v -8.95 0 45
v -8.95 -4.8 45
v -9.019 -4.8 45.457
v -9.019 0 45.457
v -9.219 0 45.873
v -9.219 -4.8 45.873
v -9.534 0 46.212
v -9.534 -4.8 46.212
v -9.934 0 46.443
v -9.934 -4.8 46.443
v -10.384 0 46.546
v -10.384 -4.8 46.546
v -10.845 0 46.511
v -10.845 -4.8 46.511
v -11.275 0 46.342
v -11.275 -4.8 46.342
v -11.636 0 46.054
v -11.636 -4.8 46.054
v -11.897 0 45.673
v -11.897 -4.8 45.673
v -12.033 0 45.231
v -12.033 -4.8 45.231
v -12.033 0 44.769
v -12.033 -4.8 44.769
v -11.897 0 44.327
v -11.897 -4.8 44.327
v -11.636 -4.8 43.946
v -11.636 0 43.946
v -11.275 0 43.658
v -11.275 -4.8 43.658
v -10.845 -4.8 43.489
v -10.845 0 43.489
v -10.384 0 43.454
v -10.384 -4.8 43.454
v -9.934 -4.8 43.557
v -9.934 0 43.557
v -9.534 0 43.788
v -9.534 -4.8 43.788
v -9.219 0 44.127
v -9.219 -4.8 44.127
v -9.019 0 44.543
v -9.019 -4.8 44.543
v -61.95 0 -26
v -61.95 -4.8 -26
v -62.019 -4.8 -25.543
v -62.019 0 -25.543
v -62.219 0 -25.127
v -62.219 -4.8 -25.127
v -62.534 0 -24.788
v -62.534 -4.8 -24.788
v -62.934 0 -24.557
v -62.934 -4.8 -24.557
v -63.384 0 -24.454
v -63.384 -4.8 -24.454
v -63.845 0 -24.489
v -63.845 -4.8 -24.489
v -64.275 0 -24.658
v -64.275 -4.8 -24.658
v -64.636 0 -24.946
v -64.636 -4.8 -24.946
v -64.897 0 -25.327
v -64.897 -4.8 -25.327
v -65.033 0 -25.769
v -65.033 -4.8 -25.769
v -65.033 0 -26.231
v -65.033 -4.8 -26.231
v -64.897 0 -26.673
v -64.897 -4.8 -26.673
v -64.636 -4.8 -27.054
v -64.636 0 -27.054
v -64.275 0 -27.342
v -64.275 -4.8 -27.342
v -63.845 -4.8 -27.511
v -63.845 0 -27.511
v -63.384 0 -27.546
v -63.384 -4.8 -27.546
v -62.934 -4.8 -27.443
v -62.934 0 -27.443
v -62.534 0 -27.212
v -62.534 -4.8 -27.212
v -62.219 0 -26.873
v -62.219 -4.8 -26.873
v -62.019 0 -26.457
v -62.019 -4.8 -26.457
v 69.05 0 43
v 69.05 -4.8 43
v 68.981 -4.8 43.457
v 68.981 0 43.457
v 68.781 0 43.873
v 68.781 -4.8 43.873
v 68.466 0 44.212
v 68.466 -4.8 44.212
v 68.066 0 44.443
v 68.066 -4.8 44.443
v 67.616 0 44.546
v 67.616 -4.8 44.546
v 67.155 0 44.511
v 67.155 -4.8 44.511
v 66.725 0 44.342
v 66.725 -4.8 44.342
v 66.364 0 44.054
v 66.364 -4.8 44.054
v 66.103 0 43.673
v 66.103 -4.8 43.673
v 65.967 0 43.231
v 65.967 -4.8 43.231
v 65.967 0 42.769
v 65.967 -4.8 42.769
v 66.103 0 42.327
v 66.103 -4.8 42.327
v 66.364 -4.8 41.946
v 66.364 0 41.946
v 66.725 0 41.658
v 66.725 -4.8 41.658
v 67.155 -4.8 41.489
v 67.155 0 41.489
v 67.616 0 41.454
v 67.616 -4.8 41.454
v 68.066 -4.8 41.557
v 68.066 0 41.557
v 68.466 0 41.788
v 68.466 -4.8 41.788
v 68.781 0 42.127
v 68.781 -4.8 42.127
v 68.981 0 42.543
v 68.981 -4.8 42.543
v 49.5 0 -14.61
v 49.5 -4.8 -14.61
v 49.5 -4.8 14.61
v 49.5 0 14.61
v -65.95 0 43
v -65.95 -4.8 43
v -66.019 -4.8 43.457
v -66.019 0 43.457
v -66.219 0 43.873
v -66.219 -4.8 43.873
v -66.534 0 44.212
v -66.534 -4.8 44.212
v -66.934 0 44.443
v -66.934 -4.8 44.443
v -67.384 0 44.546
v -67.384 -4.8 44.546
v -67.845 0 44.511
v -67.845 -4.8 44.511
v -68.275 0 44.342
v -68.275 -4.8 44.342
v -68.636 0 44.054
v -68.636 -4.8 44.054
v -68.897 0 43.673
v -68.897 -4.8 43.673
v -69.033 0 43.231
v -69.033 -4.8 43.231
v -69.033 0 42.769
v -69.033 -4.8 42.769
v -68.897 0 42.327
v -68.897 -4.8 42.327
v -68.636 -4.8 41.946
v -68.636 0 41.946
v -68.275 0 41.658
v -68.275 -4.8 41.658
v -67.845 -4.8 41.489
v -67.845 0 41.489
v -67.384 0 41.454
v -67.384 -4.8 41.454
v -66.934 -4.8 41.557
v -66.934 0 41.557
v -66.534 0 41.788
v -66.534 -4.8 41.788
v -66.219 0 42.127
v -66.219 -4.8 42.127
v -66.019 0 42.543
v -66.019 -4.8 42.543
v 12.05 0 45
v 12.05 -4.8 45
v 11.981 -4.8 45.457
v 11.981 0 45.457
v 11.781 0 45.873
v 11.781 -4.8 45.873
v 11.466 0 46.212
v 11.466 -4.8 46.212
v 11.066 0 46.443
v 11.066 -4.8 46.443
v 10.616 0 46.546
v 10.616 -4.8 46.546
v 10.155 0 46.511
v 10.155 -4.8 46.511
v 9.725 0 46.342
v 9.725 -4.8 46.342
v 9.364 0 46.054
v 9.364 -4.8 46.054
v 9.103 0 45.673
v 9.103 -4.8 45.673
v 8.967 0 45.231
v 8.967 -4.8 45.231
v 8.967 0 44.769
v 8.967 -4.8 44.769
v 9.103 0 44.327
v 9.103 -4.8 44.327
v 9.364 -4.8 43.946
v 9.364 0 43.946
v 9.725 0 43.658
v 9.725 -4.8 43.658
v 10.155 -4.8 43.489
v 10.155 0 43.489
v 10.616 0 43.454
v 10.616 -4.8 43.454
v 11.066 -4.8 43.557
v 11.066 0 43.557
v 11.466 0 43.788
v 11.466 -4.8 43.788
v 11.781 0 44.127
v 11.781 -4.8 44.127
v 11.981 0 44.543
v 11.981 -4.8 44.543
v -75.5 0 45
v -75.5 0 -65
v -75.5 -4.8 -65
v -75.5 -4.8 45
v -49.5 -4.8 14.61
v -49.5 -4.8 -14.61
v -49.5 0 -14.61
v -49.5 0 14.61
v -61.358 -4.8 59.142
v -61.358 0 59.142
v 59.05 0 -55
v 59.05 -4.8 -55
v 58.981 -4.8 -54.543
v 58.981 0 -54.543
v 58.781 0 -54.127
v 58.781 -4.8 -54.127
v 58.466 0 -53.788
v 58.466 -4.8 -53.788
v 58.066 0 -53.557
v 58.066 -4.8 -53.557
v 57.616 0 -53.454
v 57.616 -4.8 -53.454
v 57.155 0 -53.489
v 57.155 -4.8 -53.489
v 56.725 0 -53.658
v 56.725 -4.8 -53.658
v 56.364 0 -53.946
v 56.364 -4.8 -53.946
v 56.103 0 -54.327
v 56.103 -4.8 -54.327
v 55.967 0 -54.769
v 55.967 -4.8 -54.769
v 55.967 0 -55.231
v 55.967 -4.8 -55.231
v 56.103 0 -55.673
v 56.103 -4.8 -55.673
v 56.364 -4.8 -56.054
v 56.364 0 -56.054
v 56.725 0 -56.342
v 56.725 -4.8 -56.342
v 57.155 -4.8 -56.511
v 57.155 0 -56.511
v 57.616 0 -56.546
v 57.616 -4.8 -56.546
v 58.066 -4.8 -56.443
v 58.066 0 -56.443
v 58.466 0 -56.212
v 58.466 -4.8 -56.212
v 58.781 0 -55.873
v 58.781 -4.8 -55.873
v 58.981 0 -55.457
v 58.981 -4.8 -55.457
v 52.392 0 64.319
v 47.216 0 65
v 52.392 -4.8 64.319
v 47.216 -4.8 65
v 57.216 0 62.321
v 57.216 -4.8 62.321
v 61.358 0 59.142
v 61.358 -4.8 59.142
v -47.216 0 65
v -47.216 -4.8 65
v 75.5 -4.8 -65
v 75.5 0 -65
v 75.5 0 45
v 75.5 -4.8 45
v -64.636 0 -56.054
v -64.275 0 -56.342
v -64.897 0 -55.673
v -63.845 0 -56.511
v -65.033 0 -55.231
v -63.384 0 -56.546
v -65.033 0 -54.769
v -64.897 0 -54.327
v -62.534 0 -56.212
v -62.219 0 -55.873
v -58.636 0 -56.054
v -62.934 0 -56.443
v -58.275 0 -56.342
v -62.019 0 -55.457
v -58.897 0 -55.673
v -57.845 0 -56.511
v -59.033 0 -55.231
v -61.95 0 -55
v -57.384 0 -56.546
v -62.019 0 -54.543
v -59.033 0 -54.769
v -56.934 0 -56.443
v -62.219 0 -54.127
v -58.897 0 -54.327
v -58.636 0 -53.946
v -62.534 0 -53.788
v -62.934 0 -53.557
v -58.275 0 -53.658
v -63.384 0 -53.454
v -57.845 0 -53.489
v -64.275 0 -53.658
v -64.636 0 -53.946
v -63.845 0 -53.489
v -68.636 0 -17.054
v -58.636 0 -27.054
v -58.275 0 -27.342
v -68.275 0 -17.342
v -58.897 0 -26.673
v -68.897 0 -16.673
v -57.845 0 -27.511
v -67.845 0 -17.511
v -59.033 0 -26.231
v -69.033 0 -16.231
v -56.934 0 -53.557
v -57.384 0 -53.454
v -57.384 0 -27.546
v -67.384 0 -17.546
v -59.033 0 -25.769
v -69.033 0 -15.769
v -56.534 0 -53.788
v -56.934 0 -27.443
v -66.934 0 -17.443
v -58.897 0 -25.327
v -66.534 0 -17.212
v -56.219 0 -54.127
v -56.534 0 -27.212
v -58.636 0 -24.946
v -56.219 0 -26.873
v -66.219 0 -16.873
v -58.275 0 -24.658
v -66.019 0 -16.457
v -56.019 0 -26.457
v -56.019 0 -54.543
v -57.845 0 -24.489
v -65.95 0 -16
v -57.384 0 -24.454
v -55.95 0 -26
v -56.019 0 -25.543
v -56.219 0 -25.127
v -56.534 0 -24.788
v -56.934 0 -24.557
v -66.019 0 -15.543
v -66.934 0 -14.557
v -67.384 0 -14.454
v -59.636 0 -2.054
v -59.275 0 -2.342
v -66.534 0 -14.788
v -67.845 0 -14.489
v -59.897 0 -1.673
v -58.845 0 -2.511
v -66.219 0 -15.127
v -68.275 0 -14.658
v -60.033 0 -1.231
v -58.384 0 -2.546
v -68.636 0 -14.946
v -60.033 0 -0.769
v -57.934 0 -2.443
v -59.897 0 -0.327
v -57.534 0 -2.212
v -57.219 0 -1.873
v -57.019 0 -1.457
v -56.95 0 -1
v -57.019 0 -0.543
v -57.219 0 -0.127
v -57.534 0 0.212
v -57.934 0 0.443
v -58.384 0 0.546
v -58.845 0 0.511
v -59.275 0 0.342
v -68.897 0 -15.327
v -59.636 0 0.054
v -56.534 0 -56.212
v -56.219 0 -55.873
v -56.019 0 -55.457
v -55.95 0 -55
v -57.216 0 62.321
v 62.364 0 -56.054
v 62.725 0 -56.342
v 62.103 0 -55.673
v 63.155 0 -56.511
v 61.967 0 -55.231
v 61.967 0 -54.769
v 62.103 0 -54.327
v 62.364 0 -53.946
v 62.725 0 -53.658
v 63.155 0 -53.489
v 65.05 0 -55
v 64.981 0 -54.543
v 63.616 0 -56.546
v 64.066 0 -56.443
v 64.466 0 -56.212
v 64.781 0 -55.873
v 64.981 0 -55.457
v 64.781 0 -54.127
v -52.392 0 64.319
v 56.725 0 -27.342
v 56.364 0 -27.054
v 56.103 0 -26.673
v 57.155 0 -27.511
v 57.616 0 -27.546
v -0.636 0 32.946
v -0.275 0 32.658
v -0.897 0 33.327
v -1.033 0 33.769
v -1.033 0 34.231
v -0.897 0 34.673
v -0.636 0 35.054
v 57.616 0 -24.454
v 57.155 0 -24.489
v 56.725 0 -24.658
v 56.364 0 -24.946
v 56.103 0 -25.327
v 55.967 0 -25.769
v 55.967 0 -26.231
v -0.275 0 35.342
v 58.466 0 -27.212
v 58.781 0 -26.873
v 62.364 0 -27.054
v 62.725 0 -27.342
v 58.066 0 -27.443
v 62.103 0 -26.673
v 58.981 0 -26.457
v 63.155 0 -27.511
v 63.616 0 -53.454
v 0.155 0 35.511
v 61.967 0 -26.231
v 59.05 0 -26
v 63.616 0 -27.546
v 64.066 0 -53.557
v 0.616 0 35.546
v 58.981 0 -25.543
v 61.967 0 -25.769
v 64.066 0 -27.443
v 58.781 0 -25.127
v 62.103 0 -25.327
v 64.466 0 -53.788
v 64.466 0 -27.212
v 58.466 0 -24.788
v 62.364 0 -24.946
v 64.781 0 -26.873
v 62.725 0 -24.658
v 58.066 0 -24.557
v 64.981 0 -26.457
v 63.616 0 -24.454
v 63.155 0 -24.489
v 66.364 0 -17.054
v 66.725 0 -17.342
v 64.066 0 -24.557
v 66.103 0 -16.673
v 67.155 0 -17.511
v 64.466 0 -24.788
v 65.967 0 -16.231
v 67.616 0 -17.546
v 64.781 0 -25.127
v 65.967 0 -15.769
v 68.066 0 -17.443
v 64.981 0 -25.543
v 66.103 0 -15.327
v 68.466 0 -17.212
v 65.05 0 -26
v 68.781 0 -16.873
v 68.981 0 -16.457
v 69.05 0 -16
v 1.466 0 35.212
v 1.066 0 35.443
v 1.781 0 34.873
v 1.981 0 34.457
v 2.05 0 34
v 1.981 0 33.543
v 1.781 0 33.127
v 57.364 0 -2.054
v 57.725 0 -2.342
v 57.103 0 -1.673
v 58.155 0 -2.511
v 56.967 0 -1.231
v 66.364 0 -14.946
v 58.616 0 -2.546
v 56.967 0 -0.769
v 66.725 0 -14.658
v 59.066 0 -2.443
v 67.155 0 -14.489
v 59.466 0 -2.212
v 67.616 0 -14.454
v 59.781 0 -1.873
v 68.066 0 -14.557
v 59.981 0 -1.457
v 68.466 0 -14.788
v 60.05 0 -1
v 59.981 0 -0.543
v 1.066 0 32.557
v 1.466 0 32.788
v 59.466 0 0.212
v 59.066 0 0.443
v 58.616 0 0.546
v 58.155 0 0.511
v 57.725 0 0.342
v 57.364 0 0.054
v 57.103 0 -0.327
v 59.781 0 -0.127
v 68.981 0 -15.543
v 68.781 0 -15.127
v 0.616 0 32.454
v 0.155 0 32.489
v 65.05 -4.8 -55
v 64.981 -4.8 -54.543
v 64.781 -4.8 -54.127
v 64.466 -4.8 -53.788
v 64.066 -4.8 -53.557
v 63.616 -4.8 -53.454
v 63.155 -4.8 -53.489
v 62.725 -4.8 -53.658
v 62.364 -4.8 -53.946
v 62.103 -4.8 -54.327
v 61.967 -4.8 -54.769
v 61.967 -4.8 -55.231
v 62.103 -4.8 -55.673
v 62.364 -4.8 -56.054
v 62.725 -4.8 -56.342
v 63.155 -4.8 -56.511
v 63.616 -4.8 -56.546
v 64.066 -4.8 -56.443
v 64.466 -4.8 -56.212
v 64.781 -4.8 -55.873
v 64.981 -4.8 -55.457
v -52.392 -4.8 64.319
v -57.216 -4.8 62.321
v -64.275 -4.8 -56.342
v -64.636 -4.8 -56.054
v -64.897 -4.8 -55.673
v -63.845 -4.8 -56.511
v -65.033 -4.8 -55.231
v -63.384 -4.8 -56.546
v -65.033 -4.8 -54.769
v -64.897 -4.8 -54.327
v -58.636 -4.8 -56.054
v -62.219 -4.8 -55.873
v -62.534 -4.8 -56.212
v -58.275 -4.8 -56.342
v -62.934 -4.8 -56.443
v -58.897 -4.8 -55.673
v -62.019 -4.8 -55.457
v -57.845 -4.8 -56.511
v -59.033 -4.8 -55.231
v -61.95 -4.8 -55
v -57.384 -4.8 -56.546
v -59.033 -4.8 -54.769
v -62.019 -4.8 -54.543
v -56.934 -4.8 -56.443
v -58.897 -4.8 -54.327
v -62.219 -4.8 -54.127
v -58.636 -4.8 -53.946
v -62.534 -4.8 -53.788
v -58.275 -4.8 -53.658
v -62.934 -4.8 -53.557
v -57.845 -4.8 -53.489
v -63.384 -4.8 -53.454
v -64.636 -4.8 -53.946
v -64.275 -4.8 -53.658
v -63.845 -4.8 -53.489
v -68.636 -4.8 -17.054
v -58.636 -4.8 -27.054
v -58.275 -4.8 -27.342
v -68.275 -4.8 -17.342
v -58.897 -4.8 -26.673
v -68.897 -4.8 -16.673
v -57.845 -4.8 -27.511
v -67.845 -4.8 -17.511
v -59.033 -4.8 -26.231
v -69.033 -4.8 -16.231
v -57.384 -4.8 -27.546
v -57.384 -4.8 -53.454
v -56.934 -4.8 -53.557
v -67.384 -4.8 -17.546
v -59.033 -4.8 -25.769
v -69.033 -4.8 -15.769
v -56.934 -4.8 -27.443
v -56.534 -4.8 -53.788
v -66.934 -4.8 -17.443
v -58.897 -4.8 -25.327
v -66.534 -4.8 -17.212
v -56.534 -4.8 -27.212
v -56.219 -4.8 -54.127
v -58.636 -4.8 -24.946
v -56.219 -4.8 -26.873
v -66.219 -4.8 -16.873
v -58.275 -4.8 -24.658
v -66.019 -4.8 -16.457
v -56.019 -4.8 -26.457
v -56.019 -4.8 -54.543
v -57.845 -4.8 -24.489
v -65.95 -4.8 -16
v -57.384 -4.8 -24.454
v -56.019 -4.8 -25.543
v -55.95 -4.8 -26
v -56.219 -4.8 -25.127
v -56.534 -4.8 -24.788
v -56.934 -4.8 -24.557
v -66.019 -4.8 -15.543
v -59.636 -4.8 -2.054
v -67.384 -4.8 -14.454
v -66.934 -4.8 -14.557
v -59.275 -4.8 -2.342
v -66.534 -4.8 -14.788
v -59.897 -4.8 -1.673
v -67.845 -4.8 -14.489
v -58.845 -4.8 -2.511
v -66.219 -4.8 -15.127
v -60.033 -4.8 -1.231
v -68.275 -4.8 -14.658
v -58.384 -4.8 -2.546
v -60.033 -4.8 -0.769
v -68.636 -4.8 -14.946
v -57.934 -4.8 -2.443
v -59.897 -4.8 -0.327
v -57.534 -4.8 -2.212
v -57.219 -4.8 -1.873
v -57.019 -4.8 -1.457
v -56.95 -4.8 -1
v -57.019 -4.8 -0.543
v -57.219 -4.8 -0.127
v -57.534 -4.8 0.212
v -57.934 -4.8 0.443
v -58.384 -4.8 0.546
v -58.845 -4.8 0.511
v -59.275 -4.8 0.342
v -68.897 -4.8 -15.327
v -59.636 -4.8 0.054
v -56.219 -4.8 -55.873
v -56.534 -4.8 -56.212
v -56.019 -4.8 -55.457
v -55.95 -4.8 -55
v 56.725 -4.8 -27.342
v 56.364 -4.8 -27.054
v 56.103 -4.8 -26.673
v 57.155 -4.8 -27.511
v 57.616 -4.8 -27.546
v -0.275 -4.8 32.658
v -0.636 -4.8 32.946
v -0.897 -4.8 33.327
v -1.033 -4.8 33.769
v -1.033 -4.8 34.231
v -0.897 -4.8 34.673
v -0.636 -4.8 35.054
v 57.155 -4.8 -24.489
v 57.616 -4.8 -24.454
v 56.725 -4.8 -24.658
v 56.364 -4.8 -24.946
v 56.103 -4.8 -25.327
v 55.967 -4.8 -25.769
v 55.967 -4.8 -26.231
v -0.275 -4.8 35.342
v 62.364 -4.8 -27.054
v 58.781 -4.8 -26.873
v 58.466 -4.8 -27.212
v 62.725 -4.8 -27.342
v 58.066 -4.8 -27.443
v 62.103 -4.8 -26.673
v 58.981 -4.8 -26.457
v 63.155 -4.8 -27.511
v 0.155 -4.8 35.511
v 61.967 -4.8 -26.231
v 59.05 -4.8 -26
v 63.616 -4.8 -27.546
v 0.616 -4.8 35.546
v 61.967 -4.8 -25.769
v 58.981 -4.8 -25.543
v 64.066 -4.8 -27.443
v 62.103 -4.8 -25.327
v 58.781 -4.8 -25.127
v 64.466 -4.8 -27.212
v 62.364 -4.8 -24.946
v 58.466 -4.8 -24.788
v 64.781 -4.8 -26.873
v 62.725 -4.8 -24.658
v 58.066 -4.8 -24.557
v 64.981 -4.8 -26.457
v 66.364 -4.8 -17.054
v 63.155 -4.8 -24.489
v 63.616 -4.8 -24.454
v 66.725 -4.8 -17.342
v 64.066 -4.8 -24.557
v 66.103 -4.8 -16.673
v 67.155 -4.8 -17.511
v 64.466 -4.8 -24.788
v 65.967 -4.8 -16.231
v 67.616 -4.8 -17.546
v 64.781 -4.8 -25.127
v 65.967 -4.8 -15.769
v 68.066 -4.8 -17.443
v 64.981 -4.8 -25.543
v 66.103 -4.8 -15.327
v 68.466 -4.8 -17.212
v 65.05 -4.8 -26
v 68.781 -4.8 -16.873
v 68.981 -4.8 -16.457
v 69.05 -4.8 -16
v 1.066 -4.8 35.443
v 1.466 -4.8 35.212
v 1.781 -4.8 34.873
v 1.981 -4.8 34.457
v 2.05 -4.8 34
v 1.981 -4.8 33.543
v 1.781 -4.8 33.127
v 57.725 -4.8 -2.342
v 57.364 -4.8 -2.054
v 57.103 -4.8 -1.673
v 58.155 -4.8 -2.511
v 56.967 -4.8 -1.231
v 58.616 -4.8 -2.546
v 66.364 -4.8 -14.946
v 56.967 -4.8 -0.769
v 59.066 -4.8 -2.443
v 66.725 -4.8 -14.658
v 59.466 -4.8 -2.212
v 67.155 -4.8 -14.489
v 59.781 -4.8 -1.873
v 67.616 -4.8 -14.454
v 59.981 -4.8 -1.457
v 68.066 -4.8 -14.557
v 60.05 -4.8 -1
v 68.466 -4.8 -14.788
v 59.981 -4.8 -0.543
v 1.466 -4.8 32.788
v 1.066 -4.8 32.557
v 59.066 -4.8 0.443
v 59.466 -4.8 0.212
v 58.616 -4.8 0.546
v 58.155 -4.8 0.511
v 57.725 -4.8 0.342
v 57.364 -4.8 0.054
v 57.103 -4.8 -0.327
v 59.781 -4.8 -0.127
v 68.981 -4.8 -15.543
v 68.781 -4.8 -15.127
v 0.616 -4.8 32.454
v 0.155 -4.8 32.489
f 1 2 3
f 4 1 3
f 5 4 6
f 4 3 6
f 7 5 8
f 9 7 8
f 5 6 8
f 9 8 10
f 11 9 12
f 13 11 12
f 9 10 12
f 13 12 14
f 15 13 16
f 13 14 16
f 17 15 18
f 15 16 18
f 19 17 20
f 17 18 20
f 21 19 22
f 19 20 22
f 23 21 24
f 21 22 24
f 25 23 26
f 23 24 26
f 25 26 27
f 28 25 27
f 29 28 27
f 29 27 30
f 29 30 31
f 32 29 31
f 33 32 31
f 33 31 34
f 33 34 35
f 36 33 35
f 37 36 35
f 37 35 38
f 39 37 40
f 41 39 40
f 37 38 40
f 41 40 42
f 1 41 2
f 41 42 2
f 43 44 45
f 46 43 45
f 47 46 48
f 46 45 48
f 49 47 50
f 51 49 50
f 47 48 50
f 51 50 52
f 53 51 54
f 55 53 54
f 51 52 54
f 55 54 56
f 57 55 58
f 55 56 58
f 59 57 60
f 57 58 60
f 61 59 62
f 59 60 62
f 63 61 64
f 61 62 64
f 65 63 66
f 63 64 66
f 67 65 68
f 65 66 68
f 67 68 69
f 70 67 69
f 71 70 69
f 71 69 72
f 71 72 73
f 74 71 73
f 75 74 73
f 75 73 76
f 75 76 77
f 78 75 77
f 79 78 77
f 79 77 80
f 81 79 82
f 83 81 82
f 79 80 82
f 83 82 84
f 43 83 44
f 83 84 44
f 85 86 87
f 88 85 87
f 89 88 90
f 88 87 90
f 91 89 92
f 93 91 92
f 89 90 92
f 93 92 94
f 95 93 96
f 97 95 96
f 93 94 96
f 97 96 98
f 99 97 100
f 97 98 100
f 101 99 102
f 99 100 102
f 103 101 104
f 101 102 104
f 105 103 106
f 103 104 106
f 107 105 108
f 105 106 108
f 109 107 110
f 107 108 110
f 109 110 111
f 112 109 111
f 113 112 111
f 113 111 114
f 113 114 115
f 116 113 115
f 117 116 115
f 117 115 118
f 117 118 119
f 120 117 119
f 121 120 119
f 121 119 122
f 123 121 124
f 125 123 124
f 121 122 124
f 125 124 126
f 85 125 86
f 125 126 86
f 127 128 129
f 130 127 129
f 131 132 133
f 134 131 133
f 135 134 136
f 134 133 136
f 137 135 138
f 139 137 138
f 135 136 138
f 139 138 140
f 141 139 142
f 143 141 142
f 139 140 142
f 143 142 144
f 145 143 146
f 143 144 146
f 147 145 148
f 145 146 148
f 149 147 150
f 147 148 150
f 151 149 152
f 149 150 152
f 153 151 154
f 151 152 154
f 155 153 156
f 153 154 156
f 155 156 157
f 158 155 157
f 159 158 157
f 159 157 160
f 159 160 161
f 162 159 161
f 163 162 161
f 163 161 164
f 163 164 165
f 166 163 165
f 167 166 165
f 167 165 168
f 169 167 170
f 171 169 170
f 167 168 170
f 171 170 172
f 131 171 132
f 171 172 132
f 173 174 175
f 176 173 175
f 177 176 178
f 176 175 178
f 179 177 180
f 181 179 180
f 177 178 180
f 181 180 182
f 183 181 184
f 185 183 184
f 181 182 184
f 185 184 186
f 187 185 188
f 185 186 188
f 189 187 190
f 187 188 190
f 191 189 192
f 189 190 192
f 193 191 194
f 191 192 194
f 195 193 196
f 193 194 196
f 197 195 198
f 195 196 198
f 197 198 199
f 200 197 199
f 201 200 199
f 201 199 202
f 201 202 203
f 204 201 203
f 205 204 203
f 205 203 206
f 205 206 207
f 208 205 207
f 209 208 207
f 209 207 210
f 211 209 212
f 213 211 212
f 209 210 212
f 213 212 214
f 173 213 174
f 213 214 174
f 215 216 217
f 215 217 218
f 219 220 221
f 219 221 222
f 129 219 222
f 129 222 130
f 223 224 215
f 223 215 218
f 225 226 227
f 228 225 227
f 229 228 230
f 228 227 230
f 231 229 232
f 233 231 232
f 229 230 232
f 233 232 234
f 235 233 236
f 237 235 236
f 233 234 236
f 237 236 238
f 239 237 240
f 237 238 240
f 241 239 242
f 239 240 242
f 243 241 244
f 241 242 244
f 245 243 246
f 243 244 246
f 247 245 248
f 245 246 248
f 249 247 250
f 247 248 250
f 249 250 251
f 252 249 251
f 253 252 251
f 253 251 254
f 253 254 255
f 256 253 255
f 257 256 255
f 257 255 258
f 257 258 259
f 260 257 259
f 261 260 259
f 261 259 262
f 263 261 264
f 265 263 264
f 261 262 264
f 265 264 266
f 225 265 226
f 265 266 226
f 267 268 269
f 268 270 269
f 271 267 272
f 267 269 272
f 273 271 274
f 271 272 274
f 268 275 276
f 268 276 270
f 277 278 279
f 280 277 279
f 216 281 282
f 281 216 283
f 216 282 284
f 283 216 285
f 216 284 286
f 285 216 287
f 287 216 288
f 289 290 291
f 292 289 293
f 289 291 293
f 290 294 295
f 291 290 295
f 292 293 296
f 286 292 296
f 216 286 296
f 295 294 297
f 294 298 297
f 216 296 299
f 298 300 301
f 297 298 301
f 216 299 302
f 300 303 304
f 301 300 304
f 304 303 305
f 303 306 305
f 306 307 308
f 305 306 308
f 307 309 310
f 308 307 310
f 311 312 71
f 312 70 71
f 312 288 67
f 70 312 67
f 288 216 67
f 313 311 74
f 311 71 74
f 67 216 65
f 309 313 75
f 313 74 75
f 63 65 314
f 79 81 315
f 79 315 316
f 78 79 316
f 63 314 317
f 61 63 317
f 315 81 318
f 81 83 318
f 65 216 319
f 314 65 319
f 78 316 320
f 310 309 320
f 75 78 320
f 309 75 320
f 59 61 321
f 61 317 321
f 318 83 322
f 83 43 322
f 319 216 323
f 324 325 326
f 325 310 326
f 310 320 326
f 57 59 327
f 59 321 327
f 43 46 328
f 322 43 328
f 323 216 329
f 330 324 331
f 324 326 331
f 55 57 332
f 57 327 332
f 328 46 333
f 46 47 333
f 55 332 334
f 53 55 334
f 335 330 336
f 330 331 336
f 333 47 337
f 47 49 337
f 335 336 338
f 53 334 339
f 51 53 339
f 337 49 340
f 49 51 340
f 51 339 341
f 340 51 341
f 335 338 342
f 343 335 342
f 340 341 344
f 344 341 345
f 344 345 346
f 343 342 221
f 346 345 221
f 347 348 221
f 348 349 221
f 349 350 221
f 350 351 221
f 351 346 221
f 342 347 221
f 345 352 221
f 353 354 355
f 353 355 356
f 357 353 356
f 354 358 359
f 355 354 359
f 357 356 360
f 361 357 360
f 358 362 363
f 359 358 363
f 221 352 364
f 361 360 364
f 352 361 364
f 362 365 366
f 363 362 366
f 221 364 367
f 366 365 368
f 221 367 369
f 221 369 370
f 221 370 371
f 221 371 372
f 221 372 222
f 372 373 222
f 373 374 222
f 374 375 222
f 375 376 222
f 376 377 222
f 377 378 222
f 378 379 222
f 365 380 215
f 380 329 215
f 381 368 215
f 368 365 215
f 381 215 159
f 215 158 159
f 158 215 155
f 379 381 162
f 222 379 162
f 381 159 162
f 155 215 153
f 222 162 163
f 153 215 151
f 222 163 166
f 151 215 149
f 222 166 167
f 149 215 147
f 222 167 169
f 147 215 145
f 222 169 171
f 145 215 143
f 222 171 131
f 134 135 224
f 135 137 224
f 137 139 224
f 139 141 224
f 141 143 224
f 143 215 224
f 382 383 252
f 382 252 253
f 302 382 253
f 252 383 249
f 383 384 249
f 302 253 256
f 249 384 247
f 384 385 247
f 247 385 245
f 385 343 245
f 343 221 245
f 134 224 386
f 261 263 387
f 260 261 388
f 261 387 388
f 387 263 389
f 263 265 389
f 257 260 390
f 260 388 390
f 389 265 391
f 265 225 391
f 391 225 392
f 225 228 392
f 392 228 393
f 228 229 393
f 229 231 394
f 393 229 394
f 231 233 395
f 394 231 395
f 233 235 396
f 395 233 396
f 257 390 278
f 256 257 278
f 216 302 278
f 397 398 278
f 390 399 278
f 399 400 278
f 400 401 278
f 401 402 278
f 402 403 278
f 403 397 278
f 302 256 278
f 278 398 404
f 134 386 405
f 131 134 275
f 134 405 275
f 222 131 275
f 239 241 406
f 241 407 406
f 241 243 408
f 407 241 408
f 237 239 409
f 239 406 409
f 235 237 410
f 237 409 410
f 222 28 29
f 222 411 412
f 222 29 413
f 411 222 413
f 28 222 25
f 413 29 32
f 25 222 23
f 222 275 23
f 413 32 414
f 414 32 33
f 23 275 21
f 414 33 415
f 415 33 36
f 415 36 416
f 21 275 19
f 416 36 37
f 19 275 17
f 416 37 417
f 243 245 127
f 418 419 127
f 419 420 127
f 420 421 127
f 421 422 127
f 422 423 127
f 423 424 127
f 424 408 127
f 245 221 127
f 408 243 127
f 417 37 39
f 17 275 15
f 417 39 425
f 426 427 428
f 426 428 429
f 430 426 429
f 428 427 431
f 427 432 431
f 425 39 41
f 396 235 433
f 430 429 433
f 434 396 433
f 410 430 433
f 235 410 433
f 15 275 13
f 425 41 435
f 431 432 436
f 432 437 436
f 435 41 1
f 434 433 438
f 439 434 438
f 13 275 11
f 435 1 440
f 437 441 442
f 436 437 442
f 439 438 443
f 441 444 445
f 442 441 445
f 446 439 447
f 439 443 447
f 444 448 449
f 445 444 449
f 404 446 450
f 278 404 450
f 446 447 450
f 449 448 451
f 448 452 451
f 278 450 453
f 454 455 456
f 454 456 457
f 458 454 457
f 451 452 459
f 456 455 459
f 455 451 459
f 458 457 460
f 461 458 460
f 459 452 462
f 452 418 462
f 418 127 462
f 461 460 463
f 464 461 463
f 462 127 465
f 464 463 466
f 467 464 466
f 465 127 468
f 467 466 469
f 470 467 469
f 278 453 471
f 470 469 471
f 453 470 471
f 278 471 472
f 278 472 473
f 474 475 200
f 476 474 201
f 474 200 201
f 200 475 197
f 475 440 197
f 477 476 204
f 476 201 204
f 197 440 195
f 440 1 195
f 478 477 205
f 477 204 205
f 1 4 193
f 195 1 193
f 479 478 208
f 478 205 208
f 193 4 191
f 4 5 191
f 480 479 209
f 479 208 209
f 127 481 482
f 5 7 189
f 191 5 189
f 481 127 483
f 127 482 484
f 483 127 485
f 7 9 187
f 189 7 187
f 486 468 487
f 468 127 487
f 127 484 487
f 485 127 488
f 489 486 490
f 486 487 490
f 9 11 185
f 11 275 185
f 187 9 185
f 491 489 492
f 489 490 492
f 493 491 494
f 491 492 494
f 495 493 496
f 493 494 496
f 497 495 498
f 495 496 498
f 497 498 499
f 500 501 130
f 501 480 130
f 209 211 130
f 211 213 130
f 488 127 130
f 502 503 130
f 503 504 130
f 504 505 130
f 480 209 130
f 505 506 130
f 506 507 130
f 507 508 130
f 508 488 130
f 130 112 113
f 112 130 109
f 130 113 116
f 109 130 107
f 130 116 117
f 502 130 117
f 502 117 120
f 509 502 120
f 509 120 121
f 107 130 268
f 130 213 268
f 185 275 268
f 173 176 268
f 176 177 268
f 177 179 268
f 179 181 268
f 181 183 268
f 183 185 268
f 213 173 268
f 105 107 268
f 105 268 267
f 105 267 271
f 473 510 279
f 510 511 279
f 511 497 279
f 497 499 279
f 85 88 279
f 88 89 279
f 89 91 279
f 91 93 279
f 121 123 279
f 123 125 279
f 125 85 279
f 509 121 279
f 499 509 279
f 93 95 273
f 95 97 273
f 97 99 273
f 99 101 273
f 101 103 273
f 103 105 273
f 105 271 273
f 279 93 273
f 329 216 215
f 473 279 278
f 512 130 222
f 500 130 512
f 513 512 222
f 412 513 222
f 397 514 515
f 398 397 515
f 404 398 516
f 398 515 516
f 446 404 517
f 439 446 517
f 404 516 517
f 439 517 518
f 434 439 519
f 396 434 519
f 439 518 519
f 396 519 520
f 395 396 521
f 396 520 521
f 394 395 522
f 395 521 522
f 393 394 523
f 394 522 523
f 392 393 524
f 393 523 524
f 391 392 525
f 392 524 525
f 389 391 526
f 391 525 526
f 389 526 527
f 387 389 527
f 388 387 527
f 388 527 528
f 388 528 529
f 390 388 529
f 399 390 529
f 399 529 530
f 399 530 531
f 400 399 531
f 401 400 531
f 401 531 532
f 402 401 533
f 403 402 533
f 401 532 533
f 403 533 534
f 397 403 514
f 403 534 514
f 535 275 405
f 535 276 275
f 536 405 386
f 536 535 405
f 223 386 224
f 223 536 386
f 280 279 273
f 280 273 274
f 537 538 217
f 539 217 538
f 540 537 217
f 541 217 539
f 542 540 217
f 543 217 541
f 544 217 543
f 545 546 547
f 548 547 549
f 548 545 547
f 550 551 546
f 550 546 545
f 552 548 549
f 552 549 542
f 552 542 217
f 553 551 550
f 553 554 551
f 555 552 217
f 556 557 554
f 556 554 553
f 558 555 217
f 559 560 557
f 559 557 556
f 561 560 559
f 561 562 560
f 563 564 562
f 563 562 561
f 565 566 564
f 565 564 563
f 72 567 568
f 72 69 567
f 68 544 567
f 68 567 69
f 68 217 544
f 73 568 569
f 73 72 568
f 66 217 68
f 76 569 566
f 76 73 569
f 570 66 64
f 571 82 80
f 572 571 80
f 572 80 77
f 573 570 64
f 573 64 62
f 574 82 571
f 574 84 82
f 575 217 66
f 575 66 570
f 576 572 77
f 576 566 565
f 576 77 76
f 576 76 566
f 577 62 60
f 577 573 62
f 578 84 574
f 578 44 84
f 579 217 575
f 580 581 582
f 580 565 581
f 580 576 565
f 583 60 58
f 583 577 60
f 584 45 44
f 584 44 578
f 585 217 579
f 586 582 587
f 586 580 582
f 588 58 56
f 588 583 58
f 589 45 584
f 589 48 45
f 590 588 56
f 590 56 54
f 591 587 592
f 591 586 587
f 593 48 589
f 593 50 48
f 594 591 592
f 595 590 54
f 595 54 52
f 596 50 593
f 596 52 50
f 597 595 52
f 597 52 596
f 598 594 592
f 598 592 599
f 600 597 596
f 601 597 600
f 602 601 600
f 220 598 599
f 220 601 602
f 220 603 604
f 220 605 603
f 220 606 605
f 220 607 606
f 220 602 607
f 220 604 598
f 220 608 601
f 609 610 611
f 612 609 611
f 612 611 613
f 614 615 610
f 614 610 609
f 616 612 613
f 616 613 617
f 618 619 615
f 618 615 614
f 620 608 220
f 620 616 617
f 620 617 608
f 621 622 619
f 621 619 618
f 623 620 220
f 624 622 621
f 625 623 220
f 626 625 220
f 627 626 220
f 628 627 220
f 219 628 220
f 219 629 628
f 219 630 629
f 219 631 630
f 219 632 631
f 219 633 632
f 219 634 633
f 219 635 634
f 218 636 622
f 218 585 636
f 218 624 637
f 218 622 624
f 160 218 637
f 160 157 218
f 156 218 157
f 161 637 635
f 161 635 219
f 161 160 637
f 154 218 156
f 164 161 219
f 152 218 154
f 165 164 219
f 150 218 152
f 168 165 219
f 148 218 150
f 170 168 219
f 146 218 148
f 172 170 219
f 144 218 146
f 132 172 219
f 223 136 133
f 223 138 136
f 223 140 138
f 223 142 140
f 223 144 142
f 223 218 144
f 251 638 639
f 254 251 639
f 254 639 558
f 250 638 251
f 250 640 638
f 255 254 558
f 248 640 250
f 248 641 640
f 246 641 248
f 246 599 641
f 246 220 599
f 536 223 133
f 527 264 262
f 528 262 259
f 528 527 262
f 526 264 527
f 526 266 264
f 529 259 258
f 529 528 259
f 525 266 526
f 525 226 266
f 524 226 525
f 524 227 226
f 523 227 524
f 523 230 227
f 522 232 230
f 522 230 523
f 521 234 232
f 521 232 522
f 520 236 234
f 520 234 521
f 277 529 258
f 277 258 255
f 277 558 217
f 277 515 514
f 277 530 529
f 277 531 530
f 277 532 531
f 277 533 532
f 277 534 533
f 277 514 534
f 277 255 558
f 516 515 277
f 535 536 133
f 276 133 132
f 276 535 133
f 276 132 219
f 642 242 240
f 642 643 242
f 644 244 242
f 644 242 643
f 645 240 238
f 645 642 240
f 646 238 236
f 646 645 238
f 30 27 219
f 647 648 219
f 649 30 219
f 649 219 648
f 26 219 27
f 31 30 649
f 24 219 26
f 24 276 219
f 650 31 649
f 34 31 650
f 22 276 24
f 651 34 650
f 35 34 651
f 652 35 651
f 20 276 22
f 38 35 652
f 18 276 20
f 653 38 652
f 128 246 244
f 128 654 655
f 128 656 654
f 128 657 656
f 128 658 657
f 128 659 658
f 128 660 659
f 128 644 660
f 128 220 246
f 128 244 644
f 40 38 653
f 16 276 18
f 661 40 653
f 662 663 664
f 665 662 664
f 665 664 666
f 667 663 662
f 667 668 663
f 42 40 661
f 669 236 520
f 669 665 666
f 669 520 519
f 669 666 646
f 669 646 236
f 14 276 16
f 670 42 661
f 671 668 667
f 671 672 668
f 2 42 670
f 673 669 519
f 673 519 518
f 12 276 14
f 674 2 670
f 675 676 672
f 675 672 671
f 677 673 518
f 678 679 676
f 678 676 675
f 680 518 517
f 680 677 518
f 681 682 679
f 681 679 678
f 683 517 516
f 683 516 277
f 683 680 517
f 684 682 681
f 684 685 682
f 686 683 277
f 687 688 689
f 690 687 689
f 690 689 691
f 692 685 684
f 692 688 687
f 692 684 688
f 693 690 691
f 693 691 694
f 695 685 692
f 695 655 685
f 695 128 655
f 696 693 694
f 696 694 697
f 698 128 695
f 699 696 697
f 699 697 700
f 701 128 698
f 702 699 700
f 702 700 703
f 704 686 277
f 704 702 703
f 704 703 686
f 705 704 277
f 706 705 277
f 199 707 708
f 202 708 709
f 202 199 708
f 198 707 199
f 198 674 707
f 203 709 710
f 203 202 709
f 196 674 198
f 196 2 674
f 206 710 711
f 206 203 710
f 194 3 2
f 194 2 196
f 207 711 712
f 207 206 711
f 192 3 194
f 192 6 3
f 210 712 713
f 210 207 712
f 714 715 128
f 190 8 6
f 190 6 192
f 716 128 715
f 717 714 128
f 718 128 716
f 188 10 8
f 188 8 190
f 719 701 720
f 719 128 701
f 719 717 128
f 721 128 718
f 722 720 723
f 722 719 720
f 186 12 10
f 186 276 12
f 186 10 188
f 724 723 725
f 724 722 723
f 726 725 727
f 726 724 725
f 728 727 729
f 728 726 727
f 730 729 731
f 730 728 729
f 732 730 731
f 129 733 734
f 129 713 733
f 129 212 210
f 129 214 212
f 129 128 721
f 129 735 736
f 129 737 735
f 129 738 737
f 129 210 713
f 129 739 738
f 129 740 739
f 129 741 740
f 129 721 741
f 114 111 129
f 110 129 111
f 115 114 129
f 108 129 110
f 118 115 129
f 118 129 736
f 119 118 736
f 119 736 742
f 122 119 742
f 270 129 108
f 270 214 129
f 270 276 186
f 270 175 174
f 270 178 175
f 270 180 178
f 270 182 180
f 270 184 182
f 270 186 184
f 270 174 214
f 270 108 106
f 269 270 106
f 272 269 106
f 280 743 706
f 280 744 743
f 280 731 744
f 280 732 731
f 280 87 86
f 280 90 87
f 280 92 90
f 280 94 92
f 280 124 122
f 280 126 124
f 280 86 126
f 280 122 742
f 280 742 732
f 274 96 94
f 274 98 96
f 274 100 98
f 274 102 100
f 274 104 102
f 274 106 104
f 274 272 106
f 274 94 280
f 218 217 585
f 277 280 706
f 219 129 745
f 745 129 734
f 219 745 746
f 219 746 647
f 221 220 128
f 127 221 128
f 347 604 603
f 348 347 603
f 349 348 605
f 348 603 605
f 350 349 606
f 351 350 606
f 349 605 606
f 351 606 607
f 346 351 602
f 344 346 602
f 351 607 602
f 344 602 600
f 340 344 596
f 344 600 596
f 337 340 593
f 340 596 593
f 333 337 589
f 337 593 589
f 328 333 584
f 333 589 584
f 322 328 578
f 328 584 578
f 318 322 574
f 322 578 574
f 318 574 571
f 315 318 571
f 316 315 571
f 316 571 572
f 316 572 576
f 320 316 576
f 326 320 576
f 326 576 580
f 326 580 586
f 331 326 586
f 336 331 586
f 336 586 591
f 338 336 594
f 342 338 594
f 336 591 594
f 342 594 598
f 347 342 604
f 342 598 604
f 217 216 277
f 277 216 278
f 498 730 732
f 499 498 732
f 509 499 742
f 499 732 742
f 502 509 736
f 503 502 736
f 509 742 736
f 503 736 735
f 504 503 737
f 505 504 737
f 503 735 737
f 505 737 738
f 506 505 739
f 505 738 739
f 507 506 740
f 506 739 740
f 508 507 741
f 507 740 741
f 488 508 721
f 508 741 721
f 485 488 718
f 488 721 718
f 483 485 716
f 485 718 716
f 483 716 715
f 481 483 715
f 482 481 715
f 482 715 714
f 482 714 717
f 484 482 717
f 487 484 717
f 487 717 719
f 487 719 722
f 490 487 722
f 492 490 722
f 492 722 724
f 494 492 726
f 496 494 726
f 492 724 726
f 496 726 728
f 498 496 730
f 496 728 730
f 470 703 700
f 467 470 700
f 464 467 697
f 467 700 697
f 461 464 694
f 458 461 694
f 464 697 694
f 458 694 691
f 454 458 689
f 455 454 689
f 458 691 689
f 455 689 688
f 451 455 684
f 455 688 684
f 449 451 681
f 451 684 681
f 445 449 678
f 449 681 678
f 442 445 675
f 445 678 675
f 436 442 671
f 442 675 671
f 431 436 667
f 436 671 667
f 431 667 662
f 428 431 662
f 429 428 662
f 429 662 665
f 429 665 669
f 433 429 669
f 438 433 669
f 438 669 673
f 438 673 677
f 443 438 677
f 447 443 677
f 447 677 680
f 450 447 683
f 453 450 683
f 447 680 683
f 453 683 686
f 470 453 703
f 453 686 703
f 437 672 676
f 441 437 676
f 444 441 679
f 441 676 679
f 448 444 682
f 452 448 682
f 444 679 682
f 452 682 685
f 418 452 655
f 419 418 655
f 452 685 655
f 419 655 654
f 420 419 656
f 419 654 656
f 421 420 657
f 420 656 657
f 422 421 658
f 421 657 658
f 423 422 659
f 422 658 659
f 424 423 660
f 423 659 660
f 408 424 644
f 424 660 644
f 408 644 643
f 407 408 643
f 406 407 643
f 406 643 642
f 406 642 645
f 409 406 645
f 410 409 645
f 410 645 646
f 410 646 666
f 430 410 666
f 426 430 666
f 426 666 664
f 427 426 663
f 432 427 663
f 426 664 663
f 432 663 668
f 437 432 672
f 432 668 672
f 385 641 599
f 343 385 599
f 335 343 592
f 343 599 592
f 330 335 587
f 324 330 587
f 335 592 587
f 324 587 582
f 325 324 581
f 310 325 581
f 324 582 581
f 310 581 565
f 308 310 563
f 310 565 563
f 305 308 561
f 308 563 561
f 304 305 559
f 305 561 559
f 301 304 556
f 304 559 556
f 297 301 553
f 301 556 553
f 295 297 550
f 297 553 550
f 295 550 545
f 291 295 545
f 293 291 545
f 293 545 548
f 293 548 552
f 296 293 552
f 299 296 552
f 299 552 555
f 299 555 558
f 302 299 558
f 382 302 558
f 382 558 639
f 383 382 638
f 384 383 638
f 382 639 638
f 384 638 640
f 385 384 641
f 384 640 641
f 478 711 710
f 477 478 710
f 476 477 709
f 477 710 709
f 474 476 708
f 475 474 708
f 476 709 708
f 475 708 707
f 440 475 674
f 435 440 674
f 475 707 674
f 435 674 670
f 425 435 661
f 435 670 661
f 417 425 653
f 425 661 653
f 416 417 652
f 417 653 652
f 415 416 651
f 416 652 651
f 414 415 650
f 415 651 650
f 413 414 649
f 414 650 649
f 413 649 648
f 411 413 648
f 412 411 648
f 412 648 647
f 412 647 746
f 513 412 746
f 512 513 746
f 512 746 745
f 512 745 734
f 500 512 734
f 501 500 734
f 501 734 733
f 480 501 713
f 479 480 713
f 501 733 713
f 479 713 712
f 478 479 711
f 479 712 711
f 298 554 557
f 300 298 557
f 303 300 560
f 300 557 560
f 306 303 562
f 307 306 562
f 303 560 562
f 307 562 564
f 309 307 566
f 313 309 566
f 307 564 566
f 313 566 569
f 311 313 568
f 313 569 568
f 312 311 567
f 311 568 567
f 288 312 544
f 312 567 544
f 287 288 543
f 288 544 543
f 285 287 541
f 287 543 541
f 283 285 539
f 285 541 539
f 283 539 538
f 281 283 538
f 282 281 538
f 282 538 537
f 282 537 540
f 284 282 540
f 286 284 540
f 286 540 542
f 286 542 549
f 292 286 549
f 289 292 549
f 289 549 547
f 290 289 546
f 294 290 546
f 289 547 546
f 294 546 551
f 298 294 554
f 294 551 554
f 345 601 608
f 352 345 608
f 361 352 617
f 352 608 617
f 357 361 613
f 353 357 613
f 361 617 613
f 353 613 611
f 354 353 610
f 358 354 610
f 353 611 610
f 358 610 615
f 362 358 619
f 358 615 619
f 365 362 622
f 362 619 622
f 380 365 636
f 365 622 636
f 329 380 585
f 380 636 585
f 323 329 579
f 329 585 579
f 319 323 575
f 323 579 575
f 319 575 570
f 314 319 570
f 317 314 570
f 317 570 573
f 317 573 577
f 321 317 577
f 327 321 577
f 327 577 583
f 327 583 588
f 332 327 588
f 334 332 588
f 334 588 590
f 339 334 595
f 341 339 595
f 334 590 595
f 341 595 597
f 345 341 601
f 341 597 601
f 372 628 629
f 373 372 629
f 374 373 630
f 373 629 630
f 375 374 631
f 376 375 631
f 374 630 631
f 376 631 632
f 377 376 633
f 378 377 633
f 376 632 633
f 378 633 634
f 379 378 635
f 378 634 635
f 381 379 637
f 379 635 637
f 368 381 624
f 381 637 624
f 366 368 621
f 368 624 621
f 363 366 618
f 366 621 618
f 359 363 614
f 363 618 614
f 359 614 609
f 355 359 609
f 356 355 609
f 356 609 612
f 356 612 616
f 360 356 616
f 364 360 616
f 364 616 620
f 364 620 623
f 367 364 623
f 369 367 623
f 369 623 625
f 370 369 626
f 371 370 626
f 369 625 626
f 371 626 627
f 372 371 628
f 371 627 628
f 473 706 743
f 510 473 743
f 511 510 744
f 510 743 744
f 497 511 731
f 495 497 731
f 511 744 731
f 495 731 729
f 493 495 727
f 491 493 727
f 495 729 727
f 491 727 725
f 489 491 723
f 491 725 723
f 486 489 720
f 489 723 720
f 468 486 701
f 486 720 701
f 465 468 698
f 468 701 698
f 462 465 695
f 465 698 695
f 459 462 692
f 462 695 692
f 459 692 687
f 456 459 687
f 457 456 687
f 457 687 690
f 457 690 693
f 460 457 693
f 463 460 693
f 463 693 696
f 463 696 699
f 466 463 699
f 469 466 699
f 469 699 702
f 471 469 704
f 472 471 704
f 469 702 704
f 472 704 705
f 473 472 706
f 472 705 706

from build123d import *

# Parameters (mm, degrees)
F0_W     = 151
F0_H     = 130
F1_DEPTH = 4.8
F2_W     = 99
F2_H     = 29.22
F3_DEPTH = 4.8
F2_R     = 1.55
F4_DEPTH = 4.8
F5_SIZE  = 20
F6_SIZE  = 20
F7_R     = 20
F8_R     = 20


with BuildPart() as f1:
    # F0 (on Front) → F1 (new body)
    with BuildSketch(Plane.XZ):
        Rectangle(F0_W, F0_H)
    extrude(amount=F1_DEPTH)

    # F2 (on face) → F3 (cut)
    with BuildSketch(Plane.XZ.offset(4.8)):
        Rectangle(F2_W, F2_H)
    extrude(amount=-F3_DEPTH, mode=Mode.SUBTRACT)

    # F2 (on face) → F4 (cut)
    with BuildSketch(Plane.XZ.offset(4.8)):
        Rectangle(F2_W, F2_H)
        with Locations((-63.5, -55)):
            Circle(F2_R)
        with Locations((-57.5, -55)):
            Circle(F2_R)
        with Locations((-63.5, -26)):
            Circle(F2_R)
        with Locations((-57.5, -26)):
            Circle(F2_R)
        with Locations((57.5, -26)):
            Circle(F2_R)
        with Locations((63.5, -26)):
            Circle(F2_R)
        with Locations((57.5, -55)):
            Circle(F2_R)
        with Locations((63.5, -55)):
            Circle(F2_R)
        with Locations((-67.5, -16)):
            Circle(F2_R)
        with Locations((67.5, -16)):
            Circle(F2_R)
        with Locations((-58.5, -1)):
            Circle(F2_R)
        with Locations((58.5, -1)):
            Circle(F2_R)
        with Locations((67.5, 43)):
            Circle(F2_R)
        with Locations((-67.5, 43)):
            Circle(F2_R)
        with Locations((-10.5, 45)):
            Circle(F2_R)
        with Locations((10.5, 45)):
            Circle(F2_R)
        with Locations((0.5, 34)):
            Circle(F2_R)
    extrude(amount=-F4_DEPTH, mode=Mode.SUBTRACT)

    # F5
    f5_edges = [f1.edges().sort_by_distance(p)[0] for p in [
        (-75.5, -2.4, 65),
    ]]
    chamfer(f5_edges, length=F5_SIZE)

    # F6
    f6_edges = [f1.edges().sort_by_distance(p)[0] for p in [
        (75.5, -2.4, 65),
    ]]
    chamfer(f6_edges, length=F6_SIZE)

    # F7
    f7_edges = [f1.edges().sort_by_distance(p)[0] for p in [
        (-55.5, -2.4, 65),
    ]]
    fillet(f7_edges, radius=F7_R)

    # F8
    f8_edges = [f1.edges().sort_by_distance(p)[0] for p in [
        (55.5, -2.4, 65),
    ]]
    fillet(f8_edges, radius=F8_R)


solid = f1.part
